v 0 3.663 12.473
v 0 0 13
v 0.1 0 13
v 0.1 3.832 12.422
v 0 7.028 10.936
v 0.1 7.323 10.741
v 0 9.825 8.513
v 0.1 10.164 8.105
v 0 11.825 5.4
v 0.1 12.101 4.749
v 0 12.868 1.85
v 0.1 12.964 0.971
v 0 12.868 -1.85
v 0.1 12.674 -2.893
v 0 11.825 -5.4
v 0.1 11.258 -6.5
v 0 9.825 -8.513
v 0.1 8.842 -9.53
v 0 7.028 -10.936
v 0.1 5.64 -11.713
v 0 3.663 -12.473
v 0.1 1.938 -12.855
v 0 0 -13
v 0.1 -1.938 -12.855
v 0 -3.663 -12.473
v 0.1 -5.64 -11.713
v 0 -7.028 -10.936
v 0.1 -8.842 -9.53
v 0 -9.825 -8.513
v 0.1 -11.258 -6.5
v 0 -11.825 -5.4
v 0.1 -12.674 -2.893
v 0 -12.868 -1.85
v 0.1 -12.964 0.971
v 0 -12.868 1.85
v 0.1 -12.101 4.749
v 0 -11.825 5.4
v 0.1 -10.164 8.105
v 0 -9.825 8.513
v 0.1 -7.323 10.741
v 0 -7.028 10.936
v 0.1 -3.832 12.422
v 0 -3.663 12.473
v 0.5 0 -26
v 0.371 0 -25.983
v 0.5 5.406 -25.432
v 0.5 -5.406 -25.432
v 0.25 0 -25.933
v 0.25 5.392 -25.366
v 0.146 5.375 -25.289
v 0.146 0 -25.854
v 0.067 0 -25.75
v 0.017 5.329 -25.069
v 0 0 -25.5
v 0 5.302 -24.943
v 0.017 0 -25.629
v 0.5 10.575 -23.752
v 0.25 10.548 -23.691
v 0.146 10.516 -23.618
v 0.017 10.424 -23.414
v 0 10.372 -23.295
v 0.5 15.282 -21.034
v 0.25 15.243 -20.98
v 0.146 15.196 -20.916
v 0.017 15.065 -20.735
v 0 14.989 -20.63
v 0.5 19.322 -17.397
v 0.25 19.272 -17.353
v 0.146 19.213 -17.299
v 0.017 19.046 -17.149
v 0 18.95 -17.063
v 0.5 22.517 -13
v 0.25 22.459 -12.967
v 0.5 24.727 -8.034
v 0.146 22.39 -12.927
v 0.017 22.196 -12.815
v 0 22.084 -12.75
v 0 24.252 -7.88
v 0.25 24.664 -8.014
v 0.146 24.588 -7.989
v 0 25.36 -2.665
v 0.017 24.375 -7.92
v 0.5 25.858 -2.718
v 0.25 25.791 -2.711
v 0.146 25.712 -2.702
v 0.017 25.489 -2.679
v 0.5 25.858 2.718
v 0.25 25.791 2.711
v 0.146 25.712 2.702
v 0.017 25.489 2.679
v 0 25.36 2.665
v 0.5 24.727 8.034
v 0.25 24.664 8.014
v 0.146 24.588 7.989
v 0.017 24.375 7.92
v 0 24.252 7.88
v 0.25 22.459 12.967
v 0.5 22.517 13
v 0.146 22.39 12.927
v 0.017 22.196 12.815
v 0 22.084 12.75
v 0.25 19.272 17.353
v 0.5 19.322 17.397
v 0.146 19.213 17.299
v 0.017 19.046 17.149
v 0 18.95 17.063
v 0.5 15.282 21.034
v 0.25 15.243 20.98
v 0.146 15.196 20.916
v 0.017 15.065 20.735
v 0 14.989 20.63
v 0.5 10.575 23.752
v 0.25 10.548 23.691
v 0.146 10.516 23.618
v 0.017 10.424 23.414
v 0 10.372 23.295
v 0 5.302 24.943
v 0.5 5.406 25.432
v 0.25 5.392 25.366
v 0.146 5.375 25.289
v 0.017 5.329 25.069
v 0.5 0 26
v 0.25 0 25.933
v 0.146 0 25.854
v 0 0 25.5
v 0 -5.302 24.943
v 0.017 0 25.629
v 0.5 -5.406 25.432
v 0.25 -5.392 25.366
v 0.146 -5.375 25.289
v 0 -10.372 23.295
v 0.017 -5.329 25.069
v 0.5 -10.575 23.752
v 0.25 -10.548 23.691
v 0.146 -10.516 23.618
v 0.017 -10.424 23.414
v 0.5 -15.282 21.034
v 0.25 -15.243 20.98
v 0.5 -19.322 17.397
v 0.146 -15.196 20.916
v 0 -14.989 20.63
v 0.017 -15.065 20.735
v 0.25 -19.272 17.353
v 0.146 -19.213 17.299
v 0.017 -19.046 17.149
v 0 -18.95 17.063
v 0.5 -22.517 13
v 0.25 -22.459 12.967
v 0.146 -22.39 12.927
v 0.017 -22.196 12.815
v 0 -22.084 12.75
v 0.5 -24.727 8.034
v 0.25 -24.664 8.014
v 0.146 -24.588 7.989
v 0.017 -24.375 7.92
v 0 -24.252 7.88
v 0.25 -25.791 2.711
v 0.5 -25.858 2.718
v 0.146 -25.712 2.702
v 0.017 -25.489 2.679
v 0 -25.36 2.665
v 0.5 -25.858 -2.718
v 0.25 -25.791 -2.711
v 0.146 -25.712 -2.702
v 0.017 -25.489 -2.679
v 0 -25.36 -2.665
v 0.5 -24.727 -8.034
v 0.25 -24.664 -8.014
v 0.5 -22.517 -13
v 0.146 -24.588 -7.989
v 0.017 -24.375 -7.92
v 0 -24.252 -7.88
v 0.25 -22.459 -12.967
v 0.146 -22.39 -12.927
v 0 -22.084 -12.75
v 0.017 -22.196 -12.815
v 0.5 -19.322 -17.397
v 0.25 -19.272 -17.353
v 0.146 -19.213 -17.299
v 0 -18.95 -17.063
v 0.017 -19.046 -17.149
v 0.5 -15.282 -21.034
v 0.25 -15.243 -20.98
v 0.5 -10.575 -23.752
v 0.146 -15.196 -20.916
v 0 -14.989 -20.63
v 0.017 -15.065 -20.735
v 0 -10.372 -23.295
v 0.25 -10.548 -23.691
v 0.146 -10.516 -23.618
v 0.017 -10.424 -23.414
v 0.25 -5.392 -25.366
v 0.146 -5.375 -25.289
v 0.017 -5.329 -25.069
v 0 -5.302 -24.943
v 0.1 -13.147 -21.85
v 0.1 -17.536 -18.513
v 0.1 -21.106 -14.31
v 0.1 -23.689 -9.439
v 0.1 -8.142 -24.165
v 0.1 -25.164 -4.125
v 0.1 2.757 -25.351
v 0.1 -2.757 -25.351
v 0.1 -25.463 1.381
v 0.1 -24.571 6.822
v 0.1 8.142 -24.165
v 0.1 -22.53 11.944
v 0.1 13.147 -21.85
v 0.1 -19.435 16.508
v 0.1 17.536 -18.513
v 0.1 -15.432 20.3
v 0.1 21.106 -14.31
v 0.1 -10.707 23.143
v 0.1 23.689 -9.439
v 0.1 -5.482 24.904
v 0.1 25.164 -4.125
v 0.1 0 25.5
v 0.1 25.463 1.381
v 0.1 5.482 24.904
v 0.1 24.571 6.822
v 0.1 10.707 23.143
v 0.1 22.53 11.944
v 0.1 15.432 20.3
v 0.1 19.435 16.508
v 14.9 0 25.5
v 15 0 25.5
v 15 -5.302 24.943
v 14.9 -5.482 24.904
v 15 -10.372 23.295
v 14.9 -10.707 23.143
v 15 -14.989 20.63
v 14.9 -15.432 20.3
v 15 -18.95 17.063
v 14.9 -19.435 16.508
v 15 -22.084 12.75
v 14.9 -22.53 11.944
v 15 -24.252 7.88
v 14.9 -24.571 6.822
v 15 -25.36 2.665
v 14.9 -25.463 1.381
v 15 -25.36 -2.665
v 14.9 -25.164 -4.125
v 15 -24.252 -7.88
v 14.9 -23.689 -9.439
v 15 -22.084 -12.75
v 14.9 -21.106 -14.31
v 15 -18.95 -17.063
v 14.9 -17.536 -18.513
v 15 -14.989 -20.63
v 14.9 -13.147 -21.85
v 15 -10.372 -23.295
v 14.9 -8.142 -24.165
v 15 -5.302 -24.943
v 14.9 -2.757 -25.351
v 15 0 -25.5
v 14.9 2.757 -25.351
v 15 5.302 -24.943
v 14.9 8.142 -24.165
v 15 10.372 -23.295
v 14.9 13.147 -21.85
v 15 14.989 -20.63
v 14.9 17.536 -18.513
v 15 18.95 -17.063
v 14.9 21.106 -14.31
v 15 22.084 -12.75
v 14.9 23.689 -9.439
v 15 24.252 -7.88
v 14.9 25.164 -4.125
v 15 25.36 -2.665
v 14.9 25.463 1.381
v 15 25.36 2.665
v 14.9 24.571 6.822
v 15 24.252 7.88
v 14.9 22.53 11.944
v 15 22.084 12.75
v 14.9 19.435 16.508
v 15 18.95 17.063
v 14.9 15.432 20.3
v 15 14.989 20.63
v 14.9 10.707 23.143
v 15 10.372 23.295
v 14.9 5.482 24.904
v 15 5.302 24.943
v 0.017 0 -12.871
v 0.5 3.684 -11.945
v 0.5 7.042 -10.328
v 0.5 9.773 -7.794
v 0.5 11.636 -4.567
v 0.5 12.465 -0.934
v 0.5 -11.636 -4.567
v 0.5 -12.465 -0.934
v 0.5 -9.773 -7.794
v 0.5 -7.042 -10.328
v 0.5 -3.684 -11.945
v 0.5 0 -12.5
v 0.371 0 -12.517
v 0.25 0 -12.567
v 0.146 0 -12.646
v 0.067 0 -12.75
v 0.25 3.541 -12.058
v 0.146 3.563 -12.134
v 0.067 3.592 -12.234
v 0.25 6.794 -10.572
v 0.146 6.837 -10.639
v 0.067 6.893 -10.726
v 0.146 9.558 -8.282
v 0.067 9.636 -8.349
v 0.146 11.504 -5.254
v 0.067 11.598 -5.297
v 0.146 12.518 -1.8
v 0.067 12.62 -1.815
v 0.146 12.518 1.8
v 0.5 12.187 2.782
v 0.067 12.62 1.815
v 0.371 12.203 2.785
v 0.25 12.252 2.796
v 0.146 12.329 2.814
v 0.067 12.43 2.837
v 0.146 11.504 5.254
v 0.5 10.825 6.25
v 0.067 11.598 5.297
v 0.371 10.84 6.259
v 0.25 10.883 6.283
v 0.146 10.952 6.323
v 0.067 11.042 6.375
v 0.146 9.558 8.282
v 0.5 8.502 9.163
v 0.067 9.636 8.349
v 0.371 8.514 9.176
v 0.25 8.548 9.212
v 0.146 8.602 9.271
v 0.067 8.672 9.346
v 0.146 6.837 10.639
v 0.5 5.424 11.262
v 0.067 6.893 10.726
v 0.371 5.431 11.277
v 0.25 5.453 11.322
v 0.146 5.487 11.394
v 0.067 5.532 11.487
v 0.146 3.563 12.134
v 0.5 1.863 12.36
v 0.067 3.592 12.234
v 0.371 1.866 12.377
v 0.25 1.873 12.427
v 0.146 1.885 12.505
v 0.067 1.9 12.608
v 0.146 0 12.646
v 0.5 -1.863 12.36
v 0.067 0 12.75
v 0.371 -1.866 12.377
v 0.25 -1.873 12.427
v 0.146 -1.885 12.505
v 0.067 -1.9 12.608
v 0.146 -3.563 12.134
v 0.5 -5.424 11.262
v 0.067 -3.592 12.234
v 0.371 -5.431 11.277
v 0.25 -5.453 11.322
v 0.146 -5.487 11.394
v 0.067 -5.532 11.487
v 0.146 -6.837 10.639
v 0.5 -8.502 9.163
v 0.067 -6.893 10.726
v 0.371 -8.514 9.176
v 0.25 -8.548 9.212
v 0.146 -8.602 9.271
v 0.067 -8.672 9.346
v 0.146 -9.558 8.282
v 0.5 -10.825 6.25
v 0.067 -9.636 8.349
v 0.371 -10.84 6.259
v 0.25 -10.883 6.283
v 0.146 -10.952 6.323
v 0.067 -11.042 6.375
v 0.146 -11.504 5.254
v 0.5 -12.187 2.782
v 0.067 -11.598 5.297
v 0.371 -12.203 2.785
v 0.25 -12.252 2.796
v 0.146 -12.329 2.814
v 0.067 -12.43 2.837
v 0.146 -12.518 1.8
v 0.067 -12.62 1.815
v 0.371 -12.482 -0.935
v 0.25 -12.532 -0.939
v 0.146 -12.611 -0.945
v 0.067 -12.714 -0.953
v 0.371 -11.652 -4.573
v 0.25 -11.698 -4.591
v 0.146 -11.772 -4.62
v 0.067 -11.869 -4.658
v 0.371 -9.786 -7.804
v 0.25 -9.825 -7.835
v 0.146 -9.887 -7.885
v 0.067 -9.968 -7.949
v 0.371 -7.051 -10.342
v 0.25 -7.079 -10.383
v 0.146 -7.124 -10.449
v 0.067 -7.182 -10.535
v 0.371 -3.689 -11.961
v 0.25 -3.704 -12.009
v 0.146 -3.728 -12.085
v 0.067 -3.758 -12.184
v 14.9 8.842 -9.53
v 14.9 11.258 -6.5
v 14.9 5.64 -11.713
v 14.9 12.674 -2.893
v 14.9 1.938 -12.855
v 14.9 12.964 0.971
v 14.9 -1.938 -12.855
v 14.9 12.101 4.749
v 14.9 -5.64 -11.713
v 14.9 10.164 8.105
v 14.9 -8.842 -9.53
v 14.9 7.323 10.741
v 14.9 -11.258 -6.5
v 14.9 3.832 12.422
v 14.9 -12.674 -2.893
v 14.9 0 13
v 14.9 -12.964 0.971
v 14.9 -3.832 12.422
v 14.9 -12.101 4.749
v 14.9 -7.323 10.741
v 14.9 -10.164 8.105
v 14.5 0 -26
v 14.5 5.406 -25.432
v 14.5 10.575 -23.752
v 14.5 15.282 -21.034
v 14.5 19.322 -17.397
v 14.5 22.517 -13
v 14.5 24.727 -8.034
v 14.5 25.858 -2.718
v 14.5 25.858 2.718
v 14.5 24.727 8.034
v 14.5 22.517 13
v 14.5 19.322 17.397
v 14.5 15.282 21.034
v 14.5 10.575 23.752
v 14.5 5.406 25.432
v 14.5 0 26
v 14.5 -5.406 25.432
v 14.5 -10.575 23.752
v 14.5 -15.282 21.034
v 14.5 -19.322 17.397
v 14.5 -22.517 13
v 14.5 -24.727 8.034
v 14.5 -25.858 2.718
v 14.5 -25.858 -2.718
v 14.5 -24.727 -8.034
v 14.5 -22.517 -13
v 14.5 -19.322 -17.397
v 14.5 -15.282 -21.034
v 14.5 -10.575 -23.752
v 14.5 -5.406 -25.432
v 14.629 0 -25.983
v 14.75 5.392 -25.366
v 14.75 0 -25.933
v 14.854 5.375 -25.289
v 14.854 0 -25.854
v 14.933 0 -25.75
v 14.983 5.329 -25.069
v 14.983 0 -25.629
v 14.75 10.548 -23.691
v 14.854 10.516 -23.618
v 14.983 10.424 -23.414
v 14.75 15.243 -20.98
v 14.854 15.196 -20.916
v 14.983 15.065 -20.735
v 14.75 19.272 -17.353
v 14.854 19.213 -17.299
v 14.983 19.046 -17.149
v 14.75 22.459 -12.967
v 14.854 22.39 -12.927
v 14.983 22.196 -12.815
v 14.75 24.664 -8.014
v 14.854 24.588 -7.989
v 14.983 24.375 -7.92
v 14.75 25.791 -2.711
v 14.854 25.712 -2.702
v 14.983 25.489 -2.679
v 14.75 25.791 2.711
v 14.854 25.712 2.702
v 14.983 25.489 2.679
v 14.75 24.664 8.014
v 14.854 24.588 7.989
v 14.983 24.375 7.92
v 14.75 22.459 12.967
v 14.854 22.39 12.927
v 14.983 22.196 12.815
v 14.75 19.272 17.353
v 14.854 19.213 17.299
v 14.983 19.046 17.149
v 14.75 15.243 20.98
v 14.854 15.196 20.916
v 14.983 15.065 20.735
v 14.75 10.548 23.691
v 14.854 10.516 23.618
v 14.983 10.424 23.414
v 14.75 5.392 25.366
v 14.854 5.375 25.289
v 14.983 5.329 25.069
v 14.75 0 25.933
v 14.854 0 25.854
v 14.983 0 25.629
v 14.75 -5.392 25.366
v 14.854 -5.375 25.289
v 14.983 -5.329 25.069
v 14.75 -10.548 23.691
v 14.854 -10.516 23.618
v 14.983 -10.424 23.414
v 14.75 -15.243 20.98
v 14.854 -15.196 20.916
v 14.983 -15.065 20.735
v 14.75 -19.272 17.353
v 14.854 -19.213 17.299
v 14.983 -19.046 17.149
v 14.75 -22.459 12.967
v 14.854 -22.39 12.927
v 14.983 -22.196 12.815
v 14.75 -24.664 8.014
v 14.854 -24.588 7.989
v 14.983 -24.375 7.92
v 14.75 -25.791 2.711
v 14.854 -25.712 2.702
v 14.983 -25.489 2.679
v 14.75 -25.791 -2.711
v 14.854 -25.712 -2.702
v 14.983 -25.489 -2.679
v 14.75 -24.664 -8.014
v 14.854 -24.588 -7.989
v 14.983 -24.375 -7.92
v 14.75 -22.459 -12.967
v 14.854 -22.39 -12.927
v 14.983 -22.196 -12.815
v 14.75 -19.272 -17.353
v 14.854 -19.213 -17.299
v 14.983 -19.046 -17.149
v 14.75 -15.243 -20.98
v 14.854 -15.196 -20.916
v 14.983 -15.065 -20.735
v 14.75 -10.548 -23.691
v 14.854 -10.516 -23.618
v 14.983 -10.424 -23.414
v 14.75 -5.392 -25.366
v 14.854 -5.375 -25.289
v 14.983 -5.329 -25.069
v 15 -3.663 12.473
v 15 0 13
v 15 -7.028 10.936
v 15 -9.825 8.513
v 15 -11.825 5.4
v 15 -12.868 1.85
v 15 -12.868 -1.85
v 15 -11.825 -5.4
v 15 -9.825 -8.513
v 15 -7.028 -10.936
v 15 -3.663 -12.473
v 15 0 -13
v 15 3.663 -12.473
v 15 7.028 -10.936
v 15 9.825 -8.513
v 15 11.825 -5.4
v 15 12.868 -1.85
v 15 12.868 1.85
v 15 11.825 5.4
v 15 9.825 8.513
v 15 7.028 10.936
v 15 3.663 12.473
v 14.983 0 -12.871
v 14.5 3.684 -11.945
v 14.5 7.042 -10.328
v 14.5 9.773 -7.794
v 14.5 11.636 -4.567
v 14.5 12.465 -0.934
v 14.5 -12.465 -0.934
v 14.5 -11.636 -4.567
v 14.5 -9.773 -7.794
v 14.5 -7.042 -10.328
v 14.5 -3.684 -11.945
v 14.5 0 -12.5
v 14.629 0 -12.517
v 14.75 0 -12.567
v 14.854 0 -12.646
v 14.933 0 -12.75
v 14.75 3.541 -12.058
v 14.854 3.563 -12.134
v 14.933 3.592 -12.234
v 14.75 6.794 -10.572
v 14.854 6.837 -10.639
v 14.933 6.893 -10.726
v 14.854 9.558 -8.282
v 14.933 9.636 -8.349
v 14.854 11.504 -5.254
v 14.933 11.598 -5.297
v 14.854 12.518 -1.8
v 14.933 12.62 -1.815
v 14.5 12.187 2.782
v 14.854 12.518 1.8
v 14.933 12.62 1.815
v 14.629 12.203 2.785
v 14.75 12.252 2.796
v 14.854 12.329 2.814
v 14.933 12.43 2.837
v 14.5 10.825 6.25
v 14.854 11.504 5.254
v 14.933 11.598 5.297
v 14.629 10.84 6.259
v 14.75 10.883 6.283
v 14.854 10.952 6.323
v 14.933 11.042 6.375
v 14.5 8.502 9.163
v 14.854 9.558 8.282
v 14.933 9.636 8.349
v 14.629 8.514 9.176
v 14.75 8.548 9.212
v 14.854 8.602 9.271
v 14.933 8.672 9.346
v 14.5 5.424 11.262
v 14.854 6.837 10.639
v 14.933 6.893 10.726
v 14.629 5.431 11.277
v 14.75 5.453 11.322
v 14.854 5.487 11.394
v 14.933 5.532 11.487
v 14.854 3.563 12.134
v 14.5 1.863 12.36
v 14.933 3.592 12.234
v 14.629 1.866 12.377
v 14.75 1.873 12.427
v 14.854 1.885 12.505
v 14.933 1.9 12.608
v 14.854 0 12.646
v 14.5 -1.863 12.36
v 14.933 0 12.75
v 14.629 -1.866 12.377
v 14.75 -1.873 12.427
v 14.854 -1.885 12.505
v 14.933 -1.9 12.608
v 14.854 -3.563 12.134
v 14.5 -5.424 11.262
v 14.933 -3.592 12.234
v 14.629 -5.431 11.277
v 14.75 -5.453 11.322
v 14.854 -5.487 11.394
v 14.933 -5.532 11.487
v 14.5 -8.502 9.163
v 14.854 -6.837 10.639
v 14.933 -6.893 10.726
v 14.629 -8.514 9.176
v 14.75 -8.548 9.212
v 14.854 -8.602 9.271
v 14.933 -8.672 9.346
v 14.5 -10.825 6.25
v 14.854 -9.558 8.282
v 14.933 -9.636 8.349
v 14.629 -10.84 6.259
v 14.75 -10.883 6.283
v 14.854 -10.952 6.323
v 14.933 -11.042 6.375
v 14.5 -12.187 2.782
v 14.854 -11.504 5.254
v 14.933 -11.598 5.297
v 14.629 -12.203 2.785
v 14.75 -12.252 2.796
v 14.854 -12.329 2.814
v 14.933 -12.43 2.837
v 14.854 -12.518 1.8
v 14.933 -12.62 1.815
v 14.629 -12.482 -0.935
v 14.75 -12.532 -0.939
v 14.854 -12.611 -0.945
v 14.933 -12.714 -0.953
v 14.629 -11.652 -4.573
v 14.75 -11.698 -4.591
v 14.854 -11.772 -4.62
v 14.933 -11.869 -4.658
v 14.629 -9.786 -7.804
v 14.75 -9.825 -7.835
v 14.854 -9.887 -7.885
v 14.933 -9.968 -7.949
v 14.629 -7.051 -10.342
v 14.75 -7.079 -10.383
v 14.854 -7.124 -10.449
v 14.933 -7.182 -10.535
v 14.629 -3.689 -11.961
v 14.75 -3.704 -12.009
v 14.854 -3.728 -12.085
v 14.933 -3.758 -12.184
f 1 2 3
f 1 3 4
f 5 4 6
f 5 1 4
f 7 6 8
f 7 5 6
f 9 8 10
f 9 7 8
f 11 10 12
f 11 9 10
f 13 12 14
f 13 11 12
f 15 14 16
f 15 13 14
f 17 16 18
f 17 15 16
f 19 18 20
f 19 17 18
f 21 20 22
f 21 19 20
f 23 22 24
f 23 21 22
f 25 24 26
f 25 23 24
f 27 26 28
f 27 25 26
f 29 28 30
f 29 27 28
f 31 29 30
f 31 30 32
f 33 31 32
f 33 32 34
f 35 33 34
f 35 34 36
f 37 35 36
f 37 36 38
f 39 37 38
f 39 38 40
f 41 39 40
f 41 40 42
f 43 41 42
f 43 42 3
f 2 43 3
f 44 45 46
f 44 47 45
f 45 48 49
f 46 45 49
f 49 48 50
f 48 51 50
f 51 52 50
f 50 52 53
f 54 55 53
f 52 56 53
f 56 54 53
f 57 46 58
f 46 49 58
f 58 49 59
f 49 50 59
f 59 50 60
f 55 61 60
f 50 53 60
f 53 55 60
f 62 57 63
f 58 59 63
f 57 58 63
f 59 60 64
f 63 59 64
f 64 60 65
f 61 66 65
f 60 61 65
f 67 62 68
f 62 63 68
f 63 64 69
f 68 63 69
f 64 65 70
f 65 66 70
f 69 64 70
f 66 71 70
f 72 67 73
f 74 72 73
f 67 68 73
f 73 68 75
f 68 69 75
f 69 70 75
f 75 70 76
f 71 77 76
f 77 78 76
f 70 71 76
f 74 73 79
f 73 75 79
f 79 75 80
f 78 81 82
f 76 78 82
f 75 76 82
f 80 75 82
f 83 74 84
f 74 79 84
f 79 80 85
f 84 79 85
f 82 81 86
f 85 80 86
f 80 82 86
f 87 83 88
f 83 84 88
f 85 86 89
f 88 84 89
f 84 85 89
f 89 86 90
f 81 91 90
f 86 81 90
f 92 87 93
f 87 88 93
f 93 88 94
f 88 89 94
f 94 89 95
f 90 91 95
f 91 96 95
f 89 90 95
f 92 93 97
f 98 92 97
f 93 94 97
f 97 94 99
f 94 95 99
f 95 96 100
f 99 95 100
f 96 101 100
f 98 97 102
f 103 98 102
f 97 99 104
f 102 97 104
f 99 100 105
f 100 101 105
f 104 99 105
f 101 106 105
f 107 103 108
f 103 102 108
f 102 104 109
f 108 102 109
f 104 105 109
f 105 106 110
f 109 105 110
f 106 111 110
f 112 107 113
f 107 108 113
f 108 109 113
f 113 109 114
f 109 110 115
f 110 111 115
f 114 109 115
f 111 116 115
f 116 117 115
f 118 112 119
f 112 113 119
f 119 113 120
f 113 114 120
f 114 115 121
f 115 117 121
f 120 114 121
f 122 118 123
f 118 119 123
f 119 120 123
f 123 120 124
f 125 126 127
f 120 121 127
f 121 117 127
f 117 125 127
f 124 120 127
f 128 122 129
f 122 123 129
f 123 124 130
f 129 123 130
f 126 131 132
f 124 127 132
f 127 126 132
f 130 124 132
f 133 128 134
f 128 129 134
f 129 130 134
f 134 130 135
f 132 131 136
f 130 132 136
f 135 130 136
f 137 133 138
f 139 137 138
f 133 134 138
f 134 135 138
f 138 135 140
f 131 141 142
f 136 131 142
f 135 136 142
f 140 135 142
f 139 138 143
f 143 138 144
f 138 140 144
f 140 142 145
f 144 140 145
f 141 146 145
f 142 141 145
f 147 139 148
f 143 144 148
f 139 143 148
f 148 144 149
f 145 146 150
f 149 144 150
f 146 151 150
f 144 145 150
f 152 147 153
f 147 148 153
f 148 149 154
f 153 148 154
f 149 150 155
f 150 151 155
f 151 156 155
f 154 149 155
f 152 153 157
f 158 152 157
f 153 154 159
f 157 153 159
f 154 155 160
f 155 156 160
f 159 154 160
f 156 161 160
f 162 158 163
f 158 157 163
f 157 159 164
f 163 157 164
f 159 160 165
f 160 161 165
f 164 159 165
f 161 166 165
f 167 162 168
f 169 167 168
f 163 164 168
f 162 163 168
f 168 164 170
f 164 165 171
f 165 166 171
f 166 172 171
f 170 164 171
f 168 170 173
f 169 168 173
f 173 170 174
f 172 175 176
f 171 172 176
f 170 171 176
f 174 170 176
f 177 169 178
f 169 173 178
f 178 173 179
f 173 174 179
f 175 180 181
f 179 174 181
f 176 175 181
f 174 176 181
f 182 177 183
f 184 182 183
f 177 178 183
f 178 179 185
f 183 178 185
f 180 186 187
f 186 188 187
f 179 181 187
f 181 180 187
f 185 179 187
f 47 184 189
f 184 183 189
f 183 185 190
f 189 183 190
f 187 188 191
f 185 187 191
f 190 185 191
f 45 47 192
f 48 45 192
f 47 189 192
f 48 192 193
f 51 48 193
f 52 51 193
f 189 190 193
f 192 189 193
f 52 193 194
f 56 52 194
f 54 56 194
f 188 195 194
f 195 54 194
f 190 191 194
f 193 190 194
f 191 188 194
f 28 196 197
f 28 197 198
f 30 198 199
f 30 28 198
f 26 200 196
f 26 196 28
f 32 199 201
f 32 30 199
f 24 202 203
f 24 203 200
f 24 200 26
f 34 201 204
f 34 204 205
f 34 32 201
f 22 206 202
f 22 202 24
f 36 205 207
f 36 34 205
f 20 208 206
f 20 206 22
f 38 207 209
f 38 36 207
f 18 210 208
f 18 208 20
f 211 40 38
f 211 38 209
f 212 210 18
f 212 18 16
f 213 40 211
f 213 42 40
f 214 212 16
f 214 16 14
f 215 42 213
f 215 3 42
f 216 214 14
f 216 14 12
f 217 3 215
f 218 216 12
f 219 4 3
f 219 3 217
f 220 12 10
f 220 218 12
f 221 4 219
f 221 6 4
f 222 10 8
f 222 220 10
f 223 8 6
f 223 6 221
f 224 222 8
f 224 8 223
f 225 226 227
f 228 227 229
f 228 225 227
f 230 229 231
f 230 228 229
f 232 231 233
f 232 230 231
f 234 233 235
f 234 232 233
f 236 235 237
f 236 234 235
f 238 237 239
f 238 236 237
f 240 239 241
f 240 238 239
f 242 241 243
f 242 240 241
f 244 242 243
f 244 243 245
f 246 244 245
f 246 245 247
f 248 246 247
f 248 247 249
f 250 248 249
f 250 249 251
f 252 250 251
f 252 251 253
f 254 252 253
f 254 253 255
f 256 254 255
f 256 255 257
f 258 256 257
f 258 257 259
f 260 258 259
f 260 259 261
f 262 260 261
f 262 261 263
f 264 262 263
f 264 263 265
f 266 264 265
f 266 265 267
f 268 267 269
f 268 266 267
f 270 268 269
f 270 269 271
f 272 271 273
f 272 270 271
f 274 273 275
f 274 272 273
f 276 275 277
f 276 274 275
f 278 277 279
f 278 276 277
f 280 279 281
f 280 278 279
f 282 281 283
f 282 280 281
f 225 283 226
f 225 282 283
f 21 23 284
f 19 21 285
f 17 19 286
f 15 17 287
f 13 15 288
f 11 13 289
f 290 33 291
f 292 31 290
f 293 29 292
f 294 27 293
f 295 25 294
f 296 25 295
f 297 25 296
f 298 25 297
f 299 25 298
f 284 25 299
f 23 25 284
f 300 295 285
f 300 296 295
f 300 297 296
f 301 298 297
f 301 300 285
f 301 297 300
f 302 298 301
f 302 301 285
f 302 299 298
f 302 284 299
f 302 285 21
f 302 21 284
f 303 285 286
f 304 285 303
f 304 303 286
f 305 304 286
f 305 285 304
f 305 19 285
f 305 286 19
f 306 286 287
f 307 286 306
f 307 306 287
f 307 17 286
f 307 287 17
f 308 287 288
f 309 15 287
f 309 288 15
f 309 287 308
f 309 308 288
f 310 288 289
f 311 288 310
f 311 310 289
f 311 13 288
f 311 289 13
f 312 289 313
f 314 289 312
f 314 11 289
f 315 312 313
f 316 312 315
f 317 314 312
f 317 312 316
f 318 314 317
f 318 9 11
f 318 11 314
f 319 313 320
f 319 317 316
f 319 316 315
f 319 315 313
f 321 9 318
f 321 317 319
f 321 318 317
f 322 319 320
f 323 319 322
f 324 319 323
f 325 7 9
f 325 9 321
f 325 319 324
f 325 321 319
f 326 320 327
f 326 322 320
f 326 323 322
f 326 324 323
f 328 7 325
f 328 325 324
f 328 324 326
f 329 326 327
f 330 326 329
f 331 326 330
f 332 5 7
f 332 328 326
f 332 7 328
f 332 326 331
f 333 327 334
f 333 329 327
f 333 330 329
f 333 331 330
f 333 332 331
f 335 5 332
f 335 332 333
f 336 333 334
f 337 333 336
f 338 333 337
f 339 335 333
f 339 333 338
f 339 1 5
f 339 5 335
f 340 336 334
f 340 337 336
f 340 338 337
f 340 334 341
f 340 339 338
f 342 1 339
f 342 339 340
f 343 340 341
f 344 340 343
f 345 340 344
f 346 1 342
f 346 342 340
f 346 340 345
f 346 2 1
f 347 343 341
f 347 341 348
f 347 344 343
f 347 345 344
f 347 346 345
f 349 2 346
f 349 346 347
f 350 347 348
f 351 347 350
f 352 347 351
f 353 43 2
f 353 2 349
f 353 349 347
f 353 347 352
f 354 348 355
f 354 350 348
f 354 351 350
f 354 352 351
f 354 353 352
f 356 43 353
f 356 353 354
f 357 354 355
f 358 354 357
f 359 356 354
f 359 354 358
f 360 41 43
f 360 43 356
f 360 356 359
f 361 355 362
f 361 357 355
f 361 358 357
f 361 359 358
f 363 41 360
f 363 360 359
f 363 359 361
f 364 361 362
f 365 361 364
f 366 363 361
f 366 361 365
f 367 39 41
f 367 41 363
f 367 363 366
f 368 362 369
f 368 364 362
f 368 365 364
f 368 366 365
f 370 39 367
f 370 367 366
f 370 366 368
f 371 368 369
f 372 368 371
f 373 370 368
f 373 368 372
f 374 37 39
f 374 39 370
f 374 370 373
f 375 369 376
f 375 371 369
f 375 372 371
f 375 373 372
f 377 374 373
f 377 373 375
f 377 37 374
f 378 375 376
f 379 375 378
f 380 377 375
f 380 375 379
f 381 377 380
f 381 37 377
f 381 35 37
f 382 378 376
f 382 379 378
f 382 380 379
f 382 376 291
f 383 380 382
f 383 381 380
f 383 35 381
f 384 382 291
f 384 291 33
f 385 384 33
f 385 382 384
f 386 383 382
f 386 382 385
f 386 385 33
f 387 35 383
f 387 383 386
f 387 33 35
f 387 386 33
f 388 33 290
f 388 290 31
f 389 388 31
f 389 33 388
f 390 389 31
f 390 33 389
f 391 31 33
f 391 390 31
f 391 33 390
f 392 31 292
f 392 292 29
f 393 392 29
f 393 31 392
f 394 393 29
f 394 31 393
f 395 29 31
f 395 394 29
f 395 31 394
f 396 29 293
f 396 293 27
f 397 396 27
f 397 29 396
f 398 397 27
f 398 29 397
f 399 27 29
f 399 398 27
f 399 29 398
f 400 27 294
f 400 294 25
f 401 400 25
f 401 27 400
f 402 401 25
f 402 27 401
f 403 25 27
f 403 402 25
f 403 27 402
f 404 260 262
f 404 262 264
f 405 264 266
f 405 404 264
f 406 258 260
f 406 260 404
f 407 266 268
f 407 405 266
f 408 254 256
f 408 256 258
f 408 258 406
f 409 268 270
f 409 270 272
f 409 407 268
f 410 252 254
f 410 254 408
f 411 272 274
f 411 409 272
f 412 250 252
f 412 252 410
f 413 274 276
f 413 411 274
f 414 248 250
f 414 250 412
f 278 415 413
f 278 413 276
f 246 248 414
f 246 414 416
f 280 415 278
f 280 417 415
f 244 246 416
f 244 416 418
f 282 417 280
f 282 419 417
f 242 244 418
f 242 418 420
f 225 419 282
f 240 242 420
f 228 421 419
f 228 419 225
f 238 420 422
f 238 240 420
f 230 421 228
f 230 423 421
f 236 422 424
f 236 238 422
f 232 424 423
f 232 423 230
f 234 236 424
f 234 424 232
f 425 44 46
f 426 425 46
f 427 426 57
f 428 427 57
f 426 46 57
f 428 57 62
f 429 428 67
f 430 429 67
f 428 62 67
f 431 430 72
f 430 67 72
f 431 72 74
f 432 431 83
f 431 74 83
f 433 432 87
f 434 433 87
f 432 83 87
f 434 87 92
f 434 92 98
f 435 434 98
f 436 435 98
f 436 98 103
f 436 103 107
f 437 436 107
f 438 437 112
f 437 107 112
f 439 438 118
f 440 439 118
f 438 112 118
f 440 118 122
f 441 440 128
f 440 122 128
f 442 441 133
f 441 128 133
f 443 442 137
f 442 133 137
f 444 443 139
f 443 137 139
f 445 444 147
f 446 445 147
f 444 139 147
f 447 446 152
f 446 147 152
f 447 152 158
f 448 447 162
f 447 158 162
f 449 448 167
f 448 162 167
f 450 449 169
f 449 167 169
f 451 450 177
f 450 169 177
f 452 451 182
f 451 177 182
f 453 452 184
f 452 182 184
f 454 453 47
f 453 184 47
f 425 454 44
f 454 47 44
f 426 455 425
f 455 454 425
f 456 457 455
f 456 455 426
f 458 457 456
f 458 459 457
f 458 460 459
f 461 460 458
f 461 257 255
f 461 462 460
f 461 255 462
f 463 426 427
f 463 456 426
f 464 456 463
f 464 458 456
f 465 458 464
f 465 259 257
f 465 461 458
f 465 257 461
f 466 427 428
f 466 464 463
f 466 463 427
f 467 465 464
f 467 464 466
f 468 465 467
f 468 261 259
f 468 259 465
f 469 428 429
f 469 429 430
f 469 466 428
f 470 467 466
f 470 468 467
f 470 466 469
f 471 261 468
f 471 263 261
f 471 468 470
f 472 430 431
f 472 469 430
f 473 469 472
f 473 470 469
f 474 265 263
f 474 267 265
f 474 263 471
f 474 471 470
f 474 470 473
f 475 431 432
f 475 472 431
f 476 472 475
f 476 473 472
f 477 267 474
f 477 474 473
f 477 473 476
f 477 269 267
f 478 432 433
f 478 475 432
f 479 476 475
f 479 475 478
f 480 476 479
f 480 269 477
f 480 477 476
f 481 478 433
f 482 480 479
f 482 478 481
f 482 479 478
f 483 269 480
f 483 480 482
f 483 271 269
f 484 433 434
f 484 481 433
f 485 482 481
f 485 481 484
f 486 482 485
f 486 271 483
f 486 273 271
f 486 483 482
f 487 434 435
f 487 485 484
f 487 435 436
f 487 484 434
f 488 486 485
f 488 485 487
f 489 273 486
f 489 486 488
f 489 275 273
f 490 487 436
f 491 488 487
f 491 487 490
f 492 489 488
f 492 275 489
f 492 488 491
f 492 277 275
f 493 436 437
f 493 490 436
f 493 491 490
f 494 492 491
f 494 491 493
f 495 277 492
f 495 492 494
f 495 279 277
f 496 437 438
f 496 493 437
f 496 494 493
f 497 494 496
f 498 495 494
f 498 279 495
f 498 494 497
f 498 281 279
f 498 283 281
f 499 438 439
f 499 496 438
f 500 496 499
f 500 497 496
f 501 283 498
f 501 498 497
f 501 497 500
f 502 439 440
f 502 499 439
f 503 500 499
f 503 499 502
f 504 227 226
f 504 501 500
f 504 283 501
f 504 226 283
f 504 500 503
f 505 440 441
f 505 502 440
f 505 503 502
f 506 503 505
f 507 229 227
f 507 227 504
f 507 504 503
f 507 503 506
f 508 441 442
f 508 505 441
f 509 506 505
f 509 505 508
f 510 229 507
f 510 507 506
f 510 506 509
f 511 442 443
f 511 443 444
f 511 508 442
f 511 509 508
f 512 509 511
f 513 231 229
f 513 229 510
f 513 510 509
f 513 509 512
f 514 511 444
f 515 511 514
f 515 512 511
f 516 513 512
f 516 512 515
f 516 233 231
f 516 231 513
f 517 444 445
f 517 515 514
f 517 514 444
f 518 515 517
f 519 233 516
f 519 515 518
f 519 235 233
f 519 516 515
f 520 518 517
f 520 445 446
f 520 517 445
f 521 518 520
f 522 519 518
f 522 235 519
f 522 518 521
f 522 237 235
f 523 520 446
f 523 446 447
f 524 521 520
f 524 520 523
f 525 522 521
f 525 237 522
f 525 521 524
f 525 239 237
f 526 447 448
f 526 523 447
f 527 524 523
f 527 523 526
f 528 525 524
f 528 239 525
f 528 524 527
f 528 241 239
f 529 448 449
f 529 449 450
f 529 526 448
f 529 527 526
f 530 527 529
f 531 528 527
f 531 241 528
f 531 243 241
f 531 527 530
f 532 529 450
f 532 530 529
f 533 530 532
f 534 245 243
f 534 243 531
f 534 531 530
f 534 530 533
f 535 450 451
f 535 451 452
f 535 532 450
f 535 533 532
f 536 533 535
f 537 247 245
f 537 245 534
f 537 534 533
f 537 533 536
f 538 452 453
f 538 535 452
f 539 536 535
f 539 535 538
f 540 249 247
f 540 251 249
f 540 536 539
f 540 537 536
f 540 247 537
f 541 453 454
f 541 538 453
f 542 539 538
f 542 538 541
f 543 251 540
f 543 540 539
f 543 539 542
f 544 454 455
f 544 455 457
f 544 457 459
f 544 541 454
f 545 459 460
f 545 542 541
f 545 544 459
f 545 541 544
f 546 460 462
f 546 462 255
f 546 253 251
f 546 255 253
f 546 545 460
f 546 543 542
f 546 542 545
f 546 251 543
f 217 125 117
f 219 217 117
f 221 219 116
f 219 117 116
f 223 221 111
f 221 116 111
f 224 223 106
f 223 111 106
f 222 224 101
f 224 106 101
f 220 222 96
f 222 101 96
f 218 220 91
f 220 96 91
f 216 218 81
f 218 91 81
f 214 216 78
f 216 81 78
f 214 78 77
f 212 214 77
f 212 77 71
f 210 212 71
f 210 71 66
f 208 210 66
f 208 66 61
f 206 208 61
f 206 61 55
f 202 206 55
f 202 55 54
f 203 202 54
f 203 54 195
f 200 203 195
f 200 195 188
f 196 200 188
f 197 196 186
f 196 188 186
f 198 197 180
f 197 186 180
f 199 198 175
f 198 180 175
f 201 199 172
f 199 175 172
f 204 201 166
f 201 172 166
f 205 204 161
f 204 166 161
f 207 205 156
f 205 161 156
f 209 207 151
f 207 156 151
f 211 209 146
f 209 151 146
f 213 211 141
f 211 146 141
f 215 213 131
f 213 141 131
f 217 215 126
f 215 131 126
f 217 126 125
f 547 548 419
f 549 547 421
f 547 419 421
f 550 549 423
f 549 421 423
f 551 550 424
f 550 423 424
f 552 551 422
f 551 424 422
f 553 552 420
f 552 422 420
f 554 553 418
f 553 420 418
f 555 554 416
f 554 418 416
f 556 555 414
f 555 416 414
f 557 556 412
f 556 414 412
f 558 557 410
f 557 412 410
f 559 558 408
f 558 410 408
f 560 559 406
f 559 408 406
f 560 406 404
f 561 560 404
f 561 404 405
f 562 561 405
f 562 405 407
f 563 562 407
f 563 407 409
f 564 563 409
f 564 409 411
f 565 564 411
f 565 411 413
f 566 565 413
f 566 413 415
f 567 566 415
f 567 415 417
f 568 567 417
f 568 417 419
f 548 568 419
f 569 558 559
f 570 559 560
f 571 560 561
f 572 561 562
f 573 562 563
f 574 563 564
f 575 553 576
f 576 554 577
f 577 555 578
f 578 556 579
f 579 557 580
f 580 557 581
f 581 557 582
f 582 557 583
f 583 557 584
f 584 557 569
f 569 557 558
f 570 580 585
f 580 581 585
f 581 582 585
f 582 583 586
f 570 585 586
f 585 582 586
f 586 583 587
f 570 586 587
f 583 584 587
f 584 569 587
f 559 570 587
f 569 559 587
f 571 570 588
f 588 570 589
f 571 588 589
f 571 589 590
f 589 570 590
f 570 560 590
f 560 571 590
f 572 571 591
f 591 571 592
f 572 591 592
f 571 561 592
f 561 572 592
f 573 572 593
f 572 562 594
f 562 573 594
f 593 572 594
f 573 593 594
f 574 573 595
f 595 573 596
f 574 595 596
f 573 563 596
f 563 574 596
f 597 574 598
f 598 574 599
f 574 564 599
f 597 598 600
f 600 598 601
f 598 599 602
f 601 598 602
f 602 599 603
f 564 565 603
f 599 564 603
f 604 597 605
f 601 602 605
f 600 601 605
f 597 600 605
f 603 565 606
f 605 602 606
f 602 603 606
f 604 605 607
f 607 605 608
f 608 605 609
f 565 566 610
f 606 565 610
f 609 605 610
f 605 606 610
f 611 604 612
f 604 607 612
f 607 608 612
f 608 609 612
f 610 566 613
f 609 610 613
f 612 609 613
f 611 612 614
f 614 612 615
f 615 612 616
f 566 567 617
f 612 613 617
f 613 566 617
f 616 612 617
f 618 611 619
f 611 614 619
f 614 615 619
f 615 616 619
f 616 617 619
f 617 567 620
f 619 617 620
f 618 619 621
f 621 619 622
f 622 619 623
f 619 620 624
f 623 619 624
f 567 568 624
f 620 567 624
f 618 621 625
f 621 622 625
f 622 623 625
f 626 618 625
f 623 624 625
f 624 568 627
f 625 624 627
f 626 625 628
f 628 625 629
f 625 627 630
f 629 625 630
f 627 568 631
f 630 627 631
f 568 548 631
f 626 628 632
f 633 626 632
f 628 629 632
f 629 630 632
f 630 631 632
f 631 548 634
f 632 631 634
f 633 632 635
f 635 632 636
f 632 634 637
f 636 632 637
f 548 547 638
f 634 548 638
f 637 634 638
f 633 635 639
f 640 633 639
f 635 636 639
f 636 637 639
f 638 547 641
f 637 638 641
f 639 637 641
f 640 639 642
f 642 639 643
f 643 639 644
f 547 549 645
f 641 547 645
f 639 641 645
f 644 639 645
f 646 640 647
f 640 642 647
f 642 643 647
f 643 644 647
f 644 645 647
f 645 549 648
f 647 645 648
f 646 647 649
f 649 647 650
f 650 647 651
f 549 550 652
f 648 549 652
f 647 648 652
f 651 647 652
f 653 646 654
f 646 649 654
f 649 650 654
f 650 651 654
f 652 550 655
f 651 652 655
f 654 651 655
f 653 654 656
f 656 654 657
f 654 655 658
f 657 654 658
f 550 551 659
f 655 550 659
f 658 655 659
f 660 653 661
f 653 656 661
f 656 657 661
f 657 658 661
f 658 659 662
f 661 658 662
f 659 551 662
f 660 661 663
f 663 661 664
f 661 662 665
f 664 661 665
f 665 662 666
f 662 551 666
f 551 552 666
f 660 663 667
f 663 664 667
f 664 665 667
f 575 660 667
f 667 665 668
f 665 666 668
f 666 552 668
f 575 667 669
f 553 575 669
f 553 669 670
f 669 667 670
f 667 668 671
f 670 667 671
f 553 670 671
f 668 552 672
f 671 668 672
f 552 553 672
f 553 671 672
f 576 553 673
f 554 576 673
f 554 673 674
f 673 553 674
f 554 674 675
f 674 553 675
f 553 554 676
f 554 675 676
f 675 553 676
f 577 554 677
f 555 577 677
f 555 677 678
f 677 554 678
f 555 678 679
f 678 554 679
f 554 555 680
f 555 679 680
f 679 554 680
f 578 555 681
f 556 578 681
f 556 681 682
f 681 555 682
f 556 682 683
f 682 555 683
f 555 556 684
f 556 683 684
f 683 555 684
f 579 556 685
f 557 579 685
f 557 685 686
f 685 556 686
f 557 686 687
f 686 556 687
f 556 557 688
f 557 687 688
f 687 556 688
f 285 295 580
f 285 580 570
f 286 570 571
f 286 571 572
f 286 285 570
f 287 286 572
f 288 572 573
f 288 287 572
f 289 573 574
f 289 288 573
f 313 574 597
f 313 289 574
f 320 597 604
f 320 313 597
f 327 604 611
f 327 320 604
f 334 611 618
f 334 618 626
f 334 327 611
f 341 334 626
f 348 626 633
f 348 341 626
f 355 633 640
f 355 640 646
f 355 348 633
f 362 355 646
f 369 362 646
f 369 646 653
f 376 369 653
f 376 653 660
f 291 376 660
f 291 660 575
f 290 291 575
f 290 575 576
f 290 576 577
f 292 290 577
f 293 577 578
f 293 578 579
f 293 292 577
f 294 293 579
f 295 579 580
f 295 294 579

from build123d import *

# Parameters (mm, degrees)
SKETCH1_R                = 26
SKETCH1_R_2              = 12.5
BASE_EXTRUDE_DEPTH       = 15
RACCORDO1_R              = 0.5
SCHIZZO1_R               = 25.5
SCHIZZO1_R_2             = 13
TAGLIO_ESTRUSIONE1_DEPTH = 0.1
TAGLIO_ESTRUSIONE2_START = -0.1
SCHIZZO2_R               = 25.5
SCHIZZO2_R_2             = 13
TAGLIO_ESTRUSIONE2_DEPTH = 0.1


with BuildPart() as part:
    # Sketch1 → Base-Extrude (new body)
    with BuildSketch(Plane(origin=(0, 0, 0), x_dir=(0, 0, -1), z_dir=(1, 0, 0))):
        Circle(SKETCH1_R)
        Circle(SKETCH1_R_2, mode=Mode.SUBTRACT)
    extrude(amount=BASE_EXTRUDE_DEPTH)

    # Raccordo1
    raccordo1_edges = [part.edges().sort_by_distance(p)[0] for p in [
        (0, 0, 26),
        (15, 0, 26),
        (0, 0, 12.5),
        (15, 0, 12.5),
    ]]
    fillet(raccordo1_edges, radius=RACCORDO1_R)

    # Schizzo1 → Taglio-Estrusione1 (cut)
    with BuildSketch(Plane.ZY):
        Circle(SCHIZZO1_R)
        Circle(SCHIZZO1_R_2, mode=Mode.SUBTRACT)
    extrude(amount=-TAGLIO_ESTRUSIONE1_DEPTH, mode=Mode.SUBTRACT)

    # Schizzo2 → Taglio-Estrusione2 (cut)
    with BuildSketch(Plane(origin=(15, 0, 0), x_dir=(0, 0, -1), z_dir=(1, 0, 0)).offset(TAGLIO_ESTRUSIONE2_START)):
        with Locations(Location((0, 0, 0), (0, 0, 180))):
            Circle(SCHIZZO2_R)
        with Locations(Location((0, 0, 0), (0, 0, 180))):
            Circle(SCHIZZO2_R_2, mode=Mode.SUBTRACT)
    extrude(amount=TAGLIO_ESTRUSIONE2_DEPTH, mode=Mode.SUBTRACT)


solid = part.part
